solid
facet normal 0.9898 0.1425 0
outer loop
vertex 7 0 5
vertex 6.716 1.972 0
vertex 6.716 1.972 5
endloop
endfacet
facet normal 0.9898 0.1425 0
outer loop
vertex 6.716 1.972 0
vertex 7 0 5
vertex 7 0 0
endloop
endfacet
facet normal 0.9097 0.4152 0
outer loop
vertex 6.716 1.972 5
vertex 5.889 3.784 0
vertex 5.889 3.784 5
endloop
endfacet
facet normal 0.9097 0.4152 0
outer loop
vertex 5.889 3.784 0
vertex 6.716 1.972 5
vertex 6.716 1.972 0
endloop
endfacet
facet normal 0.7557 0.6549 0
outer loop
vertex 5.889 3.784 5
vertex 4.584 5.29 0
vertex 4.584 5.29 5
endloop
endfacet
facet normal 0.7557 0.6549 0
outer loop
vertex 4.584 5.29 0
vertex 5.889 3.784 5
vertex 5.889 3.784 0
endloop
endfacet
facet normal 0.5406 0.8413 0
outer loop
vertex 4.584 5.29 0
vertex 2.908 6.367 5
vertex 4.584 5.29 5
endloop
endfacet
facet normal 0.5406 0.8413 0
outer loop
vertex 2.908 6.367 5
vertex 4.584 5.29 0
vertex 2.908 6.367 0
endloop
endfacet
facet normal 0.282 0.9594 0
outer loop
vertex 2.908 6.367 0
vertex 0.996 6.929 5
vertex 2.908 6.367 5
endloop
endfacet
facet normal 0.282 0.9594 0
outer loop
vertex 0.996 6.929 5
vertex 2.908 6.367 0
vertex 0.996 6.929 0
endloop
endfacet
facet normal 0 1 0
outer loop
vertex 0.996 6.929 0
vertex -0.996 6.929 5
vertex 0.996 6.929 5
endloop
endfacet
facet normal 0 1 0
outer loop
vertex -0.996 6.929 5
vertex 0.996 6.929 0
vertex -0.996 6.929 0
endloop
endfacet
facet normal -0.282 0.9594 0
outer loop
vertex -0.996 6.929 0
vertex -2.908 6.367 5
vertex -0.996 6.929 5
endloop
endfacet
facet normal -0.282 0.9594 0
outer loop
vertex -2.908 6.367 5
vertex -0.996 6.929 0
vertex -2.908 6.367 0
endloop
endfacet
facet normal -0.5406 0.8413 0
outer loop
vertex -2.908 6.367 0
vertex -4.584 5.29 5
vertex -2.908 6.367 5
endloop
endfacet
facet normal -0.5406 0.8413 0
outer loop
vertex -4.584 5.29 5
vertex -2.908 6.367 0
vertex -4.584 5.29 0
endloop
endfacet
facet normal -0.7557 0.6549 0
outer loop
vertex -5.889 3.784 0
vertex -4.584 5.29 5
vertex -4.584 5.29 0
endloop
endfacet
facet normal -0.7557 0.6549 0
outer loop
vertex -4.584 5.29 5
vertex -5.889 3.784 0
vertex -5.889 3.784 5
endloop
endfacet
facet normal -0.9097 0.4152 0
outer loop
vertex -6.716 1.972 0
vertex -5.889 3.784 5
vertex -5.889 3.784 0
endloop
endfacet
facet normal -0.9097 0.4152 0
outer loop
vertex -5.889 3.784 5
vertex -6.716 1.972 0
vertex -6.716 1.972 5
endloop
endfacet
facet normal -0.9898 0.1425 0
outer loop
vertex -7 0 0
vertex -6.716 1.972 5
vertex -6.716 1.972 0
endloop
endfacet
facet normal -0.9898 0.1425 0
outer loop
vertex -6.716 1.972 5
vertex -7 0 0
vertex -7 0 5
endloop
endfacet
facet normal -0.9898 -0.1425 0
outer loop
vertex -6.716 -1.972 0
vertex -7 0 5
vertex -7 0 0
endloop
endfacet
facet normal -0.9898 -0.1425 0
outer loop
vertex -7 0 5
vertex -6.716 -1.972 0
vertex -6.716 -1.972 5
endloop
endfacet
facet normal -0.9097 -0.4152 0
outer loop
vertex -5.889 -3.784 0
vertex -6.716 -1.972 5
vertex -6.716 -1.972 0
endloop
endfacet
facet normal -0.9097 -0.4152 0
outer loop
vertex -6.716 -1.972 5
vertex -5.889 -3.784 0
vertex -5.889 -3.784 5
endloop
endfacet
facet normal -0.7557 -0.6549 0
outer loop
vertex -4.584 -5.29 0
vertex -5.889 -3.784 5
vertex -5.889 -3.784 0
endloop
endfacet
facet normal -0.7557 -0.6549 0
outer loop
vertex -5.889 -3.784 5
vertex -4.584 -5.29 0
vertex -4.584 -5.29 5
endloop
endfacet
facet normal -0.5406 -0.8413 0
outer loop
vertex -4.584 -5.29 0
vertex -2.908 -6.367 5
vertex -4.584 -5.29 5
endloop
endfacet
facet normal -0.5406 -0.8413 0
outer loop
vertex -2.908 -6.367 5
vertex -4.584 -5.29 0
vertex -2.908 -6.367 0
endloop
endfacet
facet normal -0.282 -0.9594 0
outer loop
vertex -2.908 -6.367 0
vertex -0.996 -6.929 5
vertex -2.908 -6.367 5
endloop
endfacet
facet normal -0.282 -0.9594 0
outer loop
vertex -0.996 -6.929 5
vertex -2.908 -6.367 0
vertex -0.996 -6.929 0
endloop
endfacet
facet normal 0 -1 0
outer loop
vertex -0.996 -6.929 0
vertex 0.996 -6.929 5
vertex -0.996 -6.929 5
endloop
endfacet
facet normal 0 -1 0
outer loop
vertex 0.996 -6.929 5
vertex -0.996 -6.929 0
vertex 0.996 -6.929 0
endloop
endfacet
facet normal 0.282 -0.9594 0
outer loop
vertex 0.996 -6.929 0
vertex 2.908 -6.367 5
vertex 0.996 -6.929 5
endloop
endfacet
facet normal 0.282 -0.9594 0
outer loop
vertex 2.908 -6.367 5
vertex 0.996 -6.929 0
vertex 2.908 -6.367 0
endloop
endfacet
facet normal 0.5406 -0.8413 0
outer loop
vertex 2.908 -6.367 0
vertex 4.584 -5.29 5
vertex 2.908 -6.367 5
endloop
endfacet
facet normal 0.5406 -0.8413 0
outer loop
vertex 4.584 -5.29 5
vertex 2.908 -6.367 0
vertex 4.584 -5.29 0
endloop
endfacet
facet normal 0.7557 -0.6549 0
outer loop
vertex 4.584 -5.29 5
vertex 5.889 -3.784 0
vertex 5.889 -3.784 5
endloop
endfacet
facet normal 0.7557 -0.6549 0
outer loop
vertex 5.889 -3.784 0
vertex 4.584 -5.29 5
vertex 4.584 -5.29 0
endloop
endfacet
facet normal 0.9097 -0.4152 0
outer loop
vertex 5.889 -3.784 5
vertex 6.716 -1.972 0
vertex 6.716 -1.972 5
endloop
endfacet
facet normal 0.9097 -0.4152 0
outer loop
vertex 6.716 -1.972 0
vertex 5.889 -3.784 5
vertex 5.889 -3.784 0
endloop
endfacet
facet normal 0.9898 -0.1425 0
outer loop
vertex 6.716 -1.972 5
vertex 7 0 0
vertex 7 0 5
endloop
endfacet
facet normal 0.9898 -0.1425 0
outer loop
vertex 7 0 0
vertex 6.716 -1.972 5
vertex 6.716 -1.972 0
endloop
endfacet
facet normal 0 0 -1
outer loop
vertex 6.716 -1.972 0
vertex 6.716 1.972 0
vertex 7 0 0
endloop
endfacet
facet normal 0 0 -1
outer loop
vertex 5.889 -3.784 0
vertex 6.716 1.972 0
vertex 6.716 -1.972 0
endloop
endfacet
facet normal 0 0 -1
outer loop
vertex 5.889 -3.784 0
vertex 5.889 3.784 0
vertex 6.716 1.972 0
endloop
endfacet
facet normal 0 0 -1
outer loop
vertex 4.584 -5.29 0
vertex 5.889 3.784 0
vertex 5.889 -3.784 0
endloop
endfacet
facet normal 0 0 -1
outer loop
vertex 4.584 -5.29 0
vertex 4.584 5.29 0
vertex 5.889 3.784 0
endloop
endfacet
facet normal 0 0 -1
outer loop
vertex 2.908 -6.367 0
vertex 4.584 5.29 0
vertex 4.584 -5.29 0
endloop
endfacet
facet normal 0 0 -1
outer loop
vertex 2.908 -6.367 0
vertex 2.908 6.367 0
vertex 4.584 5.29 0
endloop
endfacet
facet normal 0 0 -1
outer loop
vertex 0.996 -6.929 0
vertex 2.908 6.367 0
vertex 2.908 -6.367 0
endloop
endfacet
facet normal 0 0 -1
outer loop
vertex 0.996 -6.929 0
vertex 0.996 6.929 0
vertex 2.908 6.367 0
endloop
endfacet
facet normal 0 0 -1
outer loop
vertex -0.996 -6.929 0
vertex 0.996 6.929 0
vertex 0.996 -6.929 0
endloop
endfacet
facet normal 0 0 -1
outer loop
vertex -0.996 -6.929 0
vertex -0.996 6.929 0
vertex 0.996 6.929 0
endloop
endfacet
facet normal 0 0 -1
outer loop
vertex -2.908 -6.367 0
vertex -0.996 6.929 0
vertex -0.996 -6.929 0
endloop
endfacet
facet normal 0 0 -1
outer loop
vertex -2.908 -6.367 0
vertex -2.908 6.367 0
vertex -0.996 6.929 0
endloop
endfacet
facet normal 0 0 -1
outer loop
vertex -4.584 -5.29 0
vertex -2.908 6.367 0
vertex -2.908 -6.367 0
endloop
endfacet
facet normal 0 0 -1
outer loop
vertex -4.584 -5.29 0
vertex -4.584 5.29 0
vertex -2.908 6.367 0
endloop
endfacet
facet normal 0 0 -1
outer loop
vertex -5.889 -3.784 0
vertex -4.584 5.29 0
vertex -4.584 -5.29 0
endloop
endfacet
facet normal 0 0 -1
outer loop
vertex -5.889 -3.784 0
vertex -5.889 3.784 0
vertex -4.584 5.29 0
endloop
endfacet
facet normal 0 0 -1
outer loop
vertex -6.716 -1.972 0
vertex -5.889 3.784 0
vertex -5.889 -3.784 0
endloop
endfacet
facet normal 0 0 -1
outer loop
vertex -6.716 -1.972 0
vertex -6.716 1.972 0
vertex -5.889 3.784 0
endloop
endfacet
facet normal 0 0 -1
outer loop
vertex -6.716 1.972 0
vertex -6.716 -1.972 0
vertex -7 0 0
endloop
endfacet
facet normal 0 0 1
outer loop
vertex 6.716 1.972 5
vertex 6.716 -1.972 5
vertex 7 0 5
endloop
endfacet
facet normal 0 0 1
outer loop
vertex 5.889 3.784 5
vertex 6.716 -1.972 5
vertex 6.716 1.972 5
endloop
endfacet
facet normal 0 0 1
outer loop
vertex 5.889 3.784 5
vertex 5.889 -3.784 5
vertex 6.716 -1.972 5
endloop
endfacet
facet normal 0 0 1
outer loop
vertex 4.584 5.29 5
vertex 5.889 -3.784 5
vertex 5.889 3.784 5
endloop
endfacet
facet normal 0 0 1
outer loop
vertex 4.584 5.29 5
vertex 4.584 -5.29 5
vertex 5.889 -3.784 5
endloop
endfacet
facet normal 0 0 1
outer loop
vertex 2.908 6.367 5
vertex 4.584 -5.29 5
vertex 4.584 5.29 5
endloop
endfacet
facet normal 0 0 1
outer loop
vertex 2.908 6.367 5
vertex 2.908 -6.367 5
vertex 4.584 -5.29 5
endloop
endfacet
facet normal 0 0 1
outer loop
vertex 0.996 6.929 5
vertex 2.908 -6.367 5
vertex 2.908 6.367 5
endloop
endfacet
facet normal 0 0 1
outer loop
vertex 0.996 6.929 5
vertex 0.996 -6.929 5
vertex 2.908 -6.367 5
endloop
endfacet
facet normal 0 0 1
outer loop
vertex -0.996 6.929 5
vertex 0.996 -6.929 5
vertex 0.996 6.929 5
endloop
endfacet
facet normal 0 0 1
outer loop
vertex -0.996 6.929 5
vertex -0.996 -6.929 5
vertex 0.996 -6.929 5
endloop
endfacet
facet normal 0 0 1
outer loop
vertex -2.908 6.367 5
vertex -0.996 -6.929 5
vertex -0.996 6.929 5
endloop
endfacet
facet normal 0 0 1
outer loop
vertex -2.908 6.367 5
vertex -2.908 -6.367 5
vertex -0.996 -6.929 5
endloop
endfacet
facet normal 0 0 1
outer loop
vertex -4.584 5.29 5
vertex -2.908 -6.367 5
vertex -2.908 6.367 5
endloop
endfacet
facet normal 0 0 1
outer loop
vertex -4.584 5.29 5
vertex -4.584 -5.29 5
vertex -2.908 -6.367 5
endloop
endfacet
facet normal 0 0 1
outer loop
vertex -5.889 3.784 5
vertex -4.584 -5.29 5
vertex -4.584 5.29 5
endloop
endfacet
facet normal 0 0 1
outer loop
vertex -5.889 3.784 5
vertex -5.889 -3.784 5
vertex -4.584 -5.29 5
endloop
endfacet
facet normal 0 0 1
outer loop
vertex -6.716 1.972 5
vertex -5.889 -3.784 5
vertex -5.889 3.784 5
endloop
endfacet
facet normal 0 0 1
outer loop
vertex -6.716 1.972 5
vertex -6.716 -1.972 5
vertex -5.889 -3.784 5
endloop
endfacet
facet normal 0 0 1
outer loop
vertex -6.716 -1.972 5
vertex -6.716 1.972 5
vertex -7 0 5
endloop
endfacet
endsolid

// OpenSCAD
// Generated by SolidPython 1.0.1 on 2020-07-29 00:46:43


cylinder(h = 5, r1 = 7, r2 = 7);
/***********************************************
*********      SolidPython code:      **********
************************************************
 
# import packages: SolidPython
from solid import *
from solid.utils import *
from itertools import chain, combinations, permutations


class Resize:

    def __init__(self, scad_file):
        self.scad_file = scad_file
        #self.scad_file = import_scad(scad_file)
        # cone/cylinder param:
        self.r1 = 0
        self.r2 = 0
        self.h = 0
        # rectangular prism param:
        self.w = 0
        self.l = 0
        # ellipse param:
        self.r = 0

    # import OpenScad code (file name corresponds to shape)


    # classify shape + parameters
    def assign(self, param1, param2, param3):
        if self.scad_file == 'cone.scad':
            self.r1 = param1
            self.r2 = param2
            self.h = param3
        elif self.scad_file == 'cylinder.scad':
            self.r1 = param1
            self.r2 = param2
            self.h = param3
        elif self.scad_file == 'rectangularPrism.scad':
            self.h = param1
            self.l = param2
            self.w = param3
        else:
            self.r = param1
            self.h = param2

    # resize parameters
    def iterate(self):
        x = range(3, 20, 2)
        i = 1
        if self.scad_file == 'cone.scad':
            tempList = list(permutations(x, 2))
            for temp in tempList:
                param1 = temp[0]
                param2 = temp[1]
                filepath = 'produced_scad_files/' + 'cone' + str(param1) + '_' + str(param2) + '_' + '.scad'
                scad_render_to_file(cylinder(h=param1, r1=param2, r2=0), filepath)

        elif self.scad_file == 'cylinder.scad':
            tempList = list(permutations(x, 3))
            for temp in tempList:
                param1 = temp[0]
                param2 = temp[1]
                filepath = 'produced_scad_files/' + 'cylinder' + str(param1) + '_' + str(param2) + '_' + '.scad'
                scad_render_to_file(cylinder(h=param1, r1=param2, r2=param2), filepath)

        elif self.scad_file == 'rectangularPrism.scad':
            tempList = list(permutations(x, 3))
            for temp in tempList:
                param1 = temp[0]
                param2 = temp[1]
                param3 = temp[2]
                filepath = 'produced_scad_files/' + 'rectangularPrism' + str(param1) + '_' + str(param2) + '_' + str(
                    param3) + '.scad'
                scad_render_to_file(cube(size=(param1, param2, param3)), filepath)

        elif self.scad_file == 'ellipse.scad':
            tempList = list(permutations(x, 4))
            for temp in tempList:
                param1 = temp[0]
                param2 = temp[1]
                param3 = temp[2]
                param4 = temp[3]
                filepath = 'produced_scad_files/' + 'ellipse' + str(param1) + '_' + str(param2) + '_' + str(param3) + '_' + str(param4) + '.scad'
                scad_render_to_file(scale([param1, param2, param3])(sphere(r=param4)), filepath)

    def render_to_scadfile(self):
        scad_render_to_file(scad, 'example.scad') 
 
************************************************/
